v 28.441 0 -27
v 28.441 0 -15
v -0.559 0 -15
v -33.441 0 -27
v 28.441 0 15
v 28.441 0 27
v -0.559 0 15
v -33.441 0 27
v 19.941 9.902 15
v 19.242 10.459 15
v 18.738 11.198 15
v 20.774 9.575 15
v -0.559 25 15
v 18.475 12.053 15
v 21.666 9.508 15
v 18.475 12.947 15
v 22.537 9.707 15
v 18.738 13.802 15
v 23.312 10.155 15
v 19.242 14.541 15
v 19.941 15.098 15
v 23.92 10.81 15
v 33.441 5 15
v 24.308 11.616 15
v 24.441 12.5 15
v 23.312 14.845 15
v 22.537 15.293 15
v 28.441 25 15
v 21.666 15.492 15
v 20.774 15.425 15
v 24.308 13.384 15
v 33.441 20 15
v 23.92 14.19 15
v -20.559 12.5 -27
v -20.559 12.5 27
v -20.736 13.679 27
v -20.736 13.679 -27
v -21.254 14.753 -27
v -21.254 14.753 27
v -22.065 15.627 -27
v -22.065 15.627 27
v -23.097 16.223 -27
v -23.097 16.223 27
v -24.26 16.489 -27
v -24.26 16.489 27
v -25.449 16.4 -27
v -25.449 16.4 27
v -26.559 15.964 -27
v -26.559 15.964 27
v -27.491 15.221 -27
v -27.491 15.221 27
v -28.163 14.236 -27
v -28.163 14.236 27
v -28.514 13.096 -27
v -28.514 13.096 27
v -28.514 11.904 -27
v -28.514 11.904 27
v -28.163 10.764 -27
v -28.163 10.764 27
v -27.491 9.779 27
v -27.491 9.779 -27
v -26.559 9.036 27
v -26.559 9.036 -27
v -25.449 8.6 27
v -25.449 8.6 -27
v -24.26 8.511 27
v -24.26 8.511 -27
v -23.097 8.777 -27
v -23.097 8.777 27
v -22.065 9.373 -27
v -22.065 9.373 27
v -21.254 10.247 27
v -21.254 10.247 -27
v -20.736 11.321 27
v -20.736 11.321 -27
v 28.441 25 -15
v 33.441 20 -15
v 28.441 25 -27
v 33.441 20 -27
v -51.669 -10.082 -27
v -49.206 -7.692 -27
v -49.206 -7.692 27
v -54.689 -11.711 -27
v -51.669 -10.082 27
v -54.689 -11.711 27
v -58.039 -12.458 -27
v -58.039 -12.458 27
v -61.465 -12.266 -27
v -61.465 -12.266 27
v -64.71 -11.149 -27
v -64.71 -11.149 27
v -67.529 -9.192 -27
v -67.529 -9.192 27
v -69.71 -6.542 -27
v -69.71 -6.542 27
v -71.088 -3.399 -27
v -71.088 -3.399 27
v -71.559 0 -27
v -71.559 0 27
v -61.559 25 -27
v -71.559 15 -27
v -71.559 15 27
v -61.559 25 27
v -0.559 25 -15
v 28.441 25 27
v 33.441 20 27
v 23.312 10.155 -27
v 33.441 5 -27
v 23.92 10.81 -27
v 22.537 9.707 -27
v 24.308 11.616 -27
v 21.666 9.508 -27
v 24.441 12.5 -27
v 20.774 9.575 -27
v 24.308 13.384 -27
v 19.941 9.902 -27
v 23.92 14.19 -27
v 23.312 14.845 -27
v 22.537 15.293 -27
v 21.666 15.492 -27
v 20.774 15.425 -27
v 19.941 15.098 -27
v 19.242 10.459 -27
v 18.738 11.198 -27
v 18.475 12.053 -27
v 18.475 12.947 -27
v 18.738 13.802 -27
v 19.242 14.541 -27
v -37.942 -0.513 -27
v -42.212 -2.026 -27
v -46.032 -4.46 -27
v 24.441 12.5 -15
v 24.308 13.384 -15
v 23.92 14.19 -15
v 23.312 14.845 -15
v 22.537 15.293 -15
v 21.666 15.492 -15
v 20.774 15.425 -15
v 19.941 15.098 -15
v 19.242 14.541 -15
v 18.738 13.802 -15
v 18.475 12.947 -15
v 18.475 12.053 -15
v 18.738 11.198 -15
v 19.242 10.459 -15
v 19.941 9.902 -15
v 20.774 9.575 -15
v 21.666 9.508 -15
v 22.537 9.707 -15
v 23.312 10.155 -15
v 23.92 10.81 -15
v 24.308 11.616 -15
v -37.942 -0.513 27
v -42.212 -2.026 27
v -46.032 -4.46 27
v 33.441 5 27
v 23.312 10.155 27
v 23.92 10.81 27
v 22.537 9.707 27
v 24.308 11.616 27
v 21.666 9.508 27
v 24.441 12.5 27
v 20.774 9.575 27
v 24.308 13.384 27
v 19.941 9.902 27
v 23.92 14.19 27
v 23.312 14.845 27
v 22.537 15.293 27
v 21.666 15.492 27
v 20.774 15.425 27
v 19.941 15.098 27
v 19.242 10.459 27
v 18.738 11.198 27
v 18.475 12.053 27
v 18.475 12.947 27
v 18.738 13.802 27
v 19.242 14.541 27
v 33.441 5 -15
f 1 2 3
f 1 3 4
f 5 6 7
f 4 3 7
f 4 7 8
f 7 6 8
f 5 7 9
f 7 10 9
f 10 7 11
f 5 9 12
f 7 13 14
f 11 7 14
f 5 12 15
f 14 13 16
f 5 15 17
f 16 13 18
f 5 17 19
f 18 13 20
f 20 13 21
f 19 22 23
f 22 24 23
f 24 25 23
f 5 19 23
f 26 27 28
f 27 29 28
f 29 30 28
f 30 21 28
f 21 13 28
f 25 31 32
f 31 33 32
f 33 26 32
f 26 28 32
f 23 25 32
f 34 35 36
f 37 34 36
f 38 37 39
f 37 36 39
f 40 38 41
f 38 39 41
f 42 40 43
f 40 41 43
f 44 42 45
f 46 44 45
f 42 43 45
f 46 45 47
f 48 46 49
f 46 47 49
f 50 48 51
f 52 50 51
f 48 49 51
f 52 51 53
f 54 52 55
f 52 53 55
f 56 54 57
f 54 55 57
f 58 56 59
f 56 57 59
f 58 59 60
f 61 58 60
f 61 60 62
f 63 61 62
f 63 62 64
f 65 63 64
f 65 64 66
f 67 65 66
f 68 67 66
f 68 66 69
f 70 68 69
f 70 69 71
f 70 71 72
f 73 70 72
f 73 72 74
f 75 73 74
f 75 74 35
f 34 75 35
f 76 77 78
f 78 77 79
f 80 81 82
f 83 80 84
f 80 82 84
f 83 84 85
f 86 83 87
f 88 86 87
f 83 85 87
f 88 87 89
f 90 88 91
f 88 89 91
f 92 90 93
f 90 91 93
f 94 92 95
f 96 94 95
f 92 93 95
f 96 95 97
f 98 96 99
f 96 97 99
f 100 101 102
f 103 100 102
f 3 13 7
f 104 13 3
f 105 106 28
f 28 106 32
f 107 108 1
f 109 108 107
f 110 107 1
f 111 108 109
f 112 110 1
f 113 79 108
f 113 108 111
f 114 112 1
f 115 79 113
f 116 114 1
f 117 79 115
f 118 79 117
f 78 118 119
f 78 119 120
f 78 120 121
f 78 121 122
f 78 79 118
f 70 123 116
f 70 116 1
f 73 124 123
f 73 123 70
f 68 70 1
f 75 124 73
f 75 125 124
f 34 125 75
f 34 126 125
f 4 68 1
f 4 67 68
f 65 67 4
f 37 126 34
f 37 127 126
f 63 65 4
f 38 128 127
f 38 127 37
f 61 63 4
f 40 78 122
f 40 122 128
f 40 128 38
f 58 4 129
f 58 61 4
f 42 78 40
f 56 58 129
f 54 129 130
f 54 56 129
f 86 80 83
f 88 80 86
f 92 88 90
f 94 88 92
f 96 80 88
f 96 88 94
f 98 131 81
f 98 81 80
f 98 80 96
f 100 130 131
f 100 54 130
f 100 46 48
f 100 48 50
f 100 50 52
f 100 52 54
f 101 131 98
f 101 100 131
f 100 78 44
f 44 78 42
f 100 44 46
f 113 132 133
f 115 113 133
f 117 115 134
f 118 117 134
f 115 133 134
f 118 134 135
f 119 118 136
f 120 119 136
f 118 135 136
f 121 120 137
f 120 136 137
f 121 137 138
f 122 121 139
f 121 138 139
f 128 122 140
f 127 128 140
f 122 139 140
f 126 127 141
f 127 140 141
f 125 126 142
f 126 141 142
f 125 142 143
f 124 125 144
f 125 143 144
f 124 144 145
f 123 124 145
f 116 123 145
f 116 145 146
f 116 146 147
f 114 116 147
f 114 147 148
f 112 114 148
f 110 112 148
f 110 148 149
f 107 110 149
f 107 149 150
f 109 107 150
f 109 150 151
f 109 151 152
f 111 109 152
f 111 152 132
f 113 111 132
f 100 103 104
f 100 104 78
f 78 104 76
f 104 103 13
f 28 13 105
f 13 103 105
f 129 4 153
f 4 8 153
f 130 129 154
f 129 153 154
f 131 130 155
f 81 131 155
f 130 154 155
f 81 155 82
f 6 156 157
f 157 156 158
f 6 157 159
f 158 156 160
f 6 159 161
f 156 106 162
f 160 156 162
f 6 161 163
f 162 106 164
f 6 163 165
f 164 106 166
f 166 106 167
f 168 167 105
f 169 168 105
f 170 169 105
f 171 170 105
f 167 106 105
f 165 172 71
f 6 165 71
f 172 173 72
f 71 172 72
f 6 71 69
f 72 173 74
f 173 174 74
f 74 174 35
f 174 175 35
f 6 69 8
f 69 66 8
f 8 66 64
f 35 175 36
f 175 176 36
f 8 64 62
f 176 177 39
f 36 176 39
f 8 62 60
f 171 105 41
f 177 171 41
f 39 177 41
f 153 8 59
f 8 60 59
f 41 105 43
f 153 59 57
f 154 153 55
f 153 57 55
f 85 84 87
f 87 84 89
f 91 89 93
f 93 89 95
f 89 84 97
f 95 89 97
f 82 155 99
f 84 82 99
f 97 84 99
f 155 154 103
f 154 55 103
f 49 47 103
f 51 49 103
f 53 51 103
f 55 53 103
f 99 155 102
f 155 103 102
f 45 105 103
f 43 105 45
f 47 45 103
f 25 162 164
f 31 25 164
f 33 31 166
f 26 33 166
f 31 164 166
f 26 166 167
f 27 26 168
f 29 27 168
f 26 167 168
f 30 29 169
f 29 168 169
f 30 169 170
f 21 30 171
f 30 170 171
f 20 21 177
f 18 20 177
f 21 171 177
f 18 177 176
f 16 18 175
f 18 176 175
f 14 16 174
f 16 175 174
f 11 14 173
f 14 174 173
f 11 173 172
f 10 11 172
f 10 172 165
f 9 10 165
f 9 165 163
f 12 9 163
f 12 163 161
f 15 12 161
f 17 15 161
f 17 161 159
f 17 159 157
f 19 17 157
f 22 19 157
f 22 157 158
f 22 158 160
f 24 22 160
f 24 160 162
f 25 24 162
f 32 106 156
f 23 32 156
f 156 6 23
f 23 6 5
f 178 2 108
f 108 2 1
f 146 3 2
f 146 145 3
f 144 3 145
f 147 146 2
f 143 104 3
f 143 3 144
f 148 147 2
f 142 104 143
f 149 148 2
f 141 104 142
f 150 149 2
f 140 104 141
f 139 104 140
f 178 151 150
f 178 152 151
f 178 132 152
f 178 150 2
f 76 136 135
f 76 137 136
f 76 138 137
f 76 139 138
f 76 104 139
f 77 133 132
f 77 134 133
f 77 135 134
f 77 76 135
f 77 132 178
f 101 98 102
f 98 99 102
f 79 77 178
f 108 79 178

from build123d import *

# Parameters (mm, degrees)
ESTRUSIONE_ESTRUSIONE1_DEPTH = 27
SMUSSO1_SIZE                 = 10
SMUSSO2_SIZE                 = 5
SCHIZZO2_W                   = 34
SCHIZZO2_H                   = 30
TAGLIO_ESTRUSIONE1_DEPTH     = 86.181546674
SCHIZZO3_R                   = 3
SCHIZZO3_R_2                 = 4
TAGLIO_ESTRUSIONE2_DEPTH     = 94.067963842


with BuildPart() as part:
    # Schizzo1 → Estrusione-Estrusione1 (new, symmetric)
    with BuildSketch(Plane.XY):
        with BuildLine():
            Line((-71.558688457, 25), (33.441311543, 25))
            Line((33.441311543, 25), (33.441311543, 0))
            Line((33.441311543, 0), (-33.441311543, 0))
            ThreePointArc((-33.441311543, 0), (-42.211891736, -2.025659315), (-49.205851182, -7.692307692))
            ThreePointArc((-49.205851182, -7.692307692), (-63.126214368, -11.819696822), (-71.558688457, 0))
            Line((-71.558688457, 0), (-71.558688457, 25))
        make_face()
    extrude(amount=ESTRUSIONE_ESTRUSIONE1_DEPTH, both=True)

    # Smusso1
    smusso1_edges = [part.edges().sort_by_distance(p)[0] for p in [
        (-71.558688457, 25, 0),
    ]]
    chamfer(smusso1_edges, length=SMUSSO1_SIZE)

    # Smusso2
    smusso2_edges = [part.edges().sort_by_distance(p)[0] for p in [
        (33.441311543, 25, 0),
        (33.441311543, 0, 0),
    ]]
    chamfer(smusso2_edges, length=SMUSSO2_SIZE)

    # Schizzo2 → Taglio-Estrusione1 (cut, through all)
    with BuildSketch(Plane(origin=(0, 25, 0), x_dir=(1, 0, 0), z_dir=(0, 1, 0))):
        with Locations((16.441311543, 0)):
            Rectangle(SCHIZZO2_W, SCHIZZO2_H)
    extrude(amount=-TAGLIO_ESTRUSIONE1_DEPTH, mode=Mode.SUBTRACT)

    # Schizzo3 → Taglio-Estrusione2 (cut, through all)
    with BuildSketch(Plane.XY.offset(27)):
        with Locations((21.441311543, 12.5)):
            Circle(SCHIZZO3_R)
        with Locations((-24.558688457, 12.5)):
            Circle(SCHIZZO3_R_2)
    extrude(amount=-TAGLIO_ESTRUSIONE2_DEPTH, mode=Mode.SUBTRACT)


solid = part.part
